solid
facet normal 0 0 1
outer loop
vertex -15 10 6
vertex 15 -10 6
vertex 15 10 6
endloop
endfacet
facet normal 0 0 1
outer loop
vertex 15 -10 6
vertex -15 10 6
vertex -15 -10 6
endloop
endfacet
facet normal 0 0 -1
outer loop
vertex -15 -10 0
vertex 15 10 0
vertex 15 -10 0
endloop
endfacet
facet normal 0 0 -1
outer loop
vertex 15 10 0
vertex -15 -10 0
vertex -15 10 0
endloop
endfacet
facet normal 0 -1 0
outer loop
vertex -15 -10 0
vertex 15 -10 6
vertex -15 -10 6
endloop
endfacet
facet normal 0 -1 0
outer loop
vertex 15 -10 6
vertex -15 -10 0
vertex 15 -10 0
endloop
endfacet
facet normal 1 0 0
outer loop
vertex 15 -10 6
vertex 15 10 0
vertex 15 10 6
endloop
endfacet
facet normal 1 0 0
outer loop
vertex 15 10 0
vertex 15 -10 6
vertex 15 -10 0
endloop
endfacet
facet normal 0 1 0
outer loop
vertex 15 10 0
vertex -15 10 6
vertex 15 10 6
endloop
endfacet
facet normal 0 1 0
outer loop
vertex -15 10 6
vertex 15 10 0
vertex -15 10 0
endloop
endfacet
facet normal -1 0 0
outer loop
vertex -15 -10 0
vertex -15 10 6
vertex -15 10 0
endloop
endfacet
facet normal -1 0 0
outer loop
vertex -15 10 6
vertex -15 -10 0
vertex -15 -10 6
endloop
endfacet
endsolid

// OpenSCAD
// Auto-generated from tests/data/feature_fixtures_manifest.json
// fixture: plate_thick
// fixture_type: plate
// description: Thick plate with thin_ratio of 0.20, validating detection in the 0.18–0.25 band unlocked by plate_thin_ratio_max=0.25.
$fn = 96;

plate_size = [30.000000, 20.000000, 6.000000];
plate_origin = [-15.000000, -10.000000, 0.000000];

module through_hole(center, diameter, height) {
  translate(center) cylinder(d=diameter, h=height, center=false);
}

module through_slot(start, end, width, height) {
  hull() {
    through_hole(start, width, height);
    through_hole(end, width, height);
  }
}

module counterbore_hole(center, through_d, bore_d, bore_depth, plate_thickness) {
  translate([center[0], center[1], -0.1])
    cylinder(d=through_d, h=plate_thickness + 0.2, center=false);
  translate([center[0], center[1], plate_thickness - bore_depth])
    cylinder(d=bore_d, h=bore_depth + 0.1, center=false);
}

difference() {
  translate(plate_origin) cube(plate_size);
}
